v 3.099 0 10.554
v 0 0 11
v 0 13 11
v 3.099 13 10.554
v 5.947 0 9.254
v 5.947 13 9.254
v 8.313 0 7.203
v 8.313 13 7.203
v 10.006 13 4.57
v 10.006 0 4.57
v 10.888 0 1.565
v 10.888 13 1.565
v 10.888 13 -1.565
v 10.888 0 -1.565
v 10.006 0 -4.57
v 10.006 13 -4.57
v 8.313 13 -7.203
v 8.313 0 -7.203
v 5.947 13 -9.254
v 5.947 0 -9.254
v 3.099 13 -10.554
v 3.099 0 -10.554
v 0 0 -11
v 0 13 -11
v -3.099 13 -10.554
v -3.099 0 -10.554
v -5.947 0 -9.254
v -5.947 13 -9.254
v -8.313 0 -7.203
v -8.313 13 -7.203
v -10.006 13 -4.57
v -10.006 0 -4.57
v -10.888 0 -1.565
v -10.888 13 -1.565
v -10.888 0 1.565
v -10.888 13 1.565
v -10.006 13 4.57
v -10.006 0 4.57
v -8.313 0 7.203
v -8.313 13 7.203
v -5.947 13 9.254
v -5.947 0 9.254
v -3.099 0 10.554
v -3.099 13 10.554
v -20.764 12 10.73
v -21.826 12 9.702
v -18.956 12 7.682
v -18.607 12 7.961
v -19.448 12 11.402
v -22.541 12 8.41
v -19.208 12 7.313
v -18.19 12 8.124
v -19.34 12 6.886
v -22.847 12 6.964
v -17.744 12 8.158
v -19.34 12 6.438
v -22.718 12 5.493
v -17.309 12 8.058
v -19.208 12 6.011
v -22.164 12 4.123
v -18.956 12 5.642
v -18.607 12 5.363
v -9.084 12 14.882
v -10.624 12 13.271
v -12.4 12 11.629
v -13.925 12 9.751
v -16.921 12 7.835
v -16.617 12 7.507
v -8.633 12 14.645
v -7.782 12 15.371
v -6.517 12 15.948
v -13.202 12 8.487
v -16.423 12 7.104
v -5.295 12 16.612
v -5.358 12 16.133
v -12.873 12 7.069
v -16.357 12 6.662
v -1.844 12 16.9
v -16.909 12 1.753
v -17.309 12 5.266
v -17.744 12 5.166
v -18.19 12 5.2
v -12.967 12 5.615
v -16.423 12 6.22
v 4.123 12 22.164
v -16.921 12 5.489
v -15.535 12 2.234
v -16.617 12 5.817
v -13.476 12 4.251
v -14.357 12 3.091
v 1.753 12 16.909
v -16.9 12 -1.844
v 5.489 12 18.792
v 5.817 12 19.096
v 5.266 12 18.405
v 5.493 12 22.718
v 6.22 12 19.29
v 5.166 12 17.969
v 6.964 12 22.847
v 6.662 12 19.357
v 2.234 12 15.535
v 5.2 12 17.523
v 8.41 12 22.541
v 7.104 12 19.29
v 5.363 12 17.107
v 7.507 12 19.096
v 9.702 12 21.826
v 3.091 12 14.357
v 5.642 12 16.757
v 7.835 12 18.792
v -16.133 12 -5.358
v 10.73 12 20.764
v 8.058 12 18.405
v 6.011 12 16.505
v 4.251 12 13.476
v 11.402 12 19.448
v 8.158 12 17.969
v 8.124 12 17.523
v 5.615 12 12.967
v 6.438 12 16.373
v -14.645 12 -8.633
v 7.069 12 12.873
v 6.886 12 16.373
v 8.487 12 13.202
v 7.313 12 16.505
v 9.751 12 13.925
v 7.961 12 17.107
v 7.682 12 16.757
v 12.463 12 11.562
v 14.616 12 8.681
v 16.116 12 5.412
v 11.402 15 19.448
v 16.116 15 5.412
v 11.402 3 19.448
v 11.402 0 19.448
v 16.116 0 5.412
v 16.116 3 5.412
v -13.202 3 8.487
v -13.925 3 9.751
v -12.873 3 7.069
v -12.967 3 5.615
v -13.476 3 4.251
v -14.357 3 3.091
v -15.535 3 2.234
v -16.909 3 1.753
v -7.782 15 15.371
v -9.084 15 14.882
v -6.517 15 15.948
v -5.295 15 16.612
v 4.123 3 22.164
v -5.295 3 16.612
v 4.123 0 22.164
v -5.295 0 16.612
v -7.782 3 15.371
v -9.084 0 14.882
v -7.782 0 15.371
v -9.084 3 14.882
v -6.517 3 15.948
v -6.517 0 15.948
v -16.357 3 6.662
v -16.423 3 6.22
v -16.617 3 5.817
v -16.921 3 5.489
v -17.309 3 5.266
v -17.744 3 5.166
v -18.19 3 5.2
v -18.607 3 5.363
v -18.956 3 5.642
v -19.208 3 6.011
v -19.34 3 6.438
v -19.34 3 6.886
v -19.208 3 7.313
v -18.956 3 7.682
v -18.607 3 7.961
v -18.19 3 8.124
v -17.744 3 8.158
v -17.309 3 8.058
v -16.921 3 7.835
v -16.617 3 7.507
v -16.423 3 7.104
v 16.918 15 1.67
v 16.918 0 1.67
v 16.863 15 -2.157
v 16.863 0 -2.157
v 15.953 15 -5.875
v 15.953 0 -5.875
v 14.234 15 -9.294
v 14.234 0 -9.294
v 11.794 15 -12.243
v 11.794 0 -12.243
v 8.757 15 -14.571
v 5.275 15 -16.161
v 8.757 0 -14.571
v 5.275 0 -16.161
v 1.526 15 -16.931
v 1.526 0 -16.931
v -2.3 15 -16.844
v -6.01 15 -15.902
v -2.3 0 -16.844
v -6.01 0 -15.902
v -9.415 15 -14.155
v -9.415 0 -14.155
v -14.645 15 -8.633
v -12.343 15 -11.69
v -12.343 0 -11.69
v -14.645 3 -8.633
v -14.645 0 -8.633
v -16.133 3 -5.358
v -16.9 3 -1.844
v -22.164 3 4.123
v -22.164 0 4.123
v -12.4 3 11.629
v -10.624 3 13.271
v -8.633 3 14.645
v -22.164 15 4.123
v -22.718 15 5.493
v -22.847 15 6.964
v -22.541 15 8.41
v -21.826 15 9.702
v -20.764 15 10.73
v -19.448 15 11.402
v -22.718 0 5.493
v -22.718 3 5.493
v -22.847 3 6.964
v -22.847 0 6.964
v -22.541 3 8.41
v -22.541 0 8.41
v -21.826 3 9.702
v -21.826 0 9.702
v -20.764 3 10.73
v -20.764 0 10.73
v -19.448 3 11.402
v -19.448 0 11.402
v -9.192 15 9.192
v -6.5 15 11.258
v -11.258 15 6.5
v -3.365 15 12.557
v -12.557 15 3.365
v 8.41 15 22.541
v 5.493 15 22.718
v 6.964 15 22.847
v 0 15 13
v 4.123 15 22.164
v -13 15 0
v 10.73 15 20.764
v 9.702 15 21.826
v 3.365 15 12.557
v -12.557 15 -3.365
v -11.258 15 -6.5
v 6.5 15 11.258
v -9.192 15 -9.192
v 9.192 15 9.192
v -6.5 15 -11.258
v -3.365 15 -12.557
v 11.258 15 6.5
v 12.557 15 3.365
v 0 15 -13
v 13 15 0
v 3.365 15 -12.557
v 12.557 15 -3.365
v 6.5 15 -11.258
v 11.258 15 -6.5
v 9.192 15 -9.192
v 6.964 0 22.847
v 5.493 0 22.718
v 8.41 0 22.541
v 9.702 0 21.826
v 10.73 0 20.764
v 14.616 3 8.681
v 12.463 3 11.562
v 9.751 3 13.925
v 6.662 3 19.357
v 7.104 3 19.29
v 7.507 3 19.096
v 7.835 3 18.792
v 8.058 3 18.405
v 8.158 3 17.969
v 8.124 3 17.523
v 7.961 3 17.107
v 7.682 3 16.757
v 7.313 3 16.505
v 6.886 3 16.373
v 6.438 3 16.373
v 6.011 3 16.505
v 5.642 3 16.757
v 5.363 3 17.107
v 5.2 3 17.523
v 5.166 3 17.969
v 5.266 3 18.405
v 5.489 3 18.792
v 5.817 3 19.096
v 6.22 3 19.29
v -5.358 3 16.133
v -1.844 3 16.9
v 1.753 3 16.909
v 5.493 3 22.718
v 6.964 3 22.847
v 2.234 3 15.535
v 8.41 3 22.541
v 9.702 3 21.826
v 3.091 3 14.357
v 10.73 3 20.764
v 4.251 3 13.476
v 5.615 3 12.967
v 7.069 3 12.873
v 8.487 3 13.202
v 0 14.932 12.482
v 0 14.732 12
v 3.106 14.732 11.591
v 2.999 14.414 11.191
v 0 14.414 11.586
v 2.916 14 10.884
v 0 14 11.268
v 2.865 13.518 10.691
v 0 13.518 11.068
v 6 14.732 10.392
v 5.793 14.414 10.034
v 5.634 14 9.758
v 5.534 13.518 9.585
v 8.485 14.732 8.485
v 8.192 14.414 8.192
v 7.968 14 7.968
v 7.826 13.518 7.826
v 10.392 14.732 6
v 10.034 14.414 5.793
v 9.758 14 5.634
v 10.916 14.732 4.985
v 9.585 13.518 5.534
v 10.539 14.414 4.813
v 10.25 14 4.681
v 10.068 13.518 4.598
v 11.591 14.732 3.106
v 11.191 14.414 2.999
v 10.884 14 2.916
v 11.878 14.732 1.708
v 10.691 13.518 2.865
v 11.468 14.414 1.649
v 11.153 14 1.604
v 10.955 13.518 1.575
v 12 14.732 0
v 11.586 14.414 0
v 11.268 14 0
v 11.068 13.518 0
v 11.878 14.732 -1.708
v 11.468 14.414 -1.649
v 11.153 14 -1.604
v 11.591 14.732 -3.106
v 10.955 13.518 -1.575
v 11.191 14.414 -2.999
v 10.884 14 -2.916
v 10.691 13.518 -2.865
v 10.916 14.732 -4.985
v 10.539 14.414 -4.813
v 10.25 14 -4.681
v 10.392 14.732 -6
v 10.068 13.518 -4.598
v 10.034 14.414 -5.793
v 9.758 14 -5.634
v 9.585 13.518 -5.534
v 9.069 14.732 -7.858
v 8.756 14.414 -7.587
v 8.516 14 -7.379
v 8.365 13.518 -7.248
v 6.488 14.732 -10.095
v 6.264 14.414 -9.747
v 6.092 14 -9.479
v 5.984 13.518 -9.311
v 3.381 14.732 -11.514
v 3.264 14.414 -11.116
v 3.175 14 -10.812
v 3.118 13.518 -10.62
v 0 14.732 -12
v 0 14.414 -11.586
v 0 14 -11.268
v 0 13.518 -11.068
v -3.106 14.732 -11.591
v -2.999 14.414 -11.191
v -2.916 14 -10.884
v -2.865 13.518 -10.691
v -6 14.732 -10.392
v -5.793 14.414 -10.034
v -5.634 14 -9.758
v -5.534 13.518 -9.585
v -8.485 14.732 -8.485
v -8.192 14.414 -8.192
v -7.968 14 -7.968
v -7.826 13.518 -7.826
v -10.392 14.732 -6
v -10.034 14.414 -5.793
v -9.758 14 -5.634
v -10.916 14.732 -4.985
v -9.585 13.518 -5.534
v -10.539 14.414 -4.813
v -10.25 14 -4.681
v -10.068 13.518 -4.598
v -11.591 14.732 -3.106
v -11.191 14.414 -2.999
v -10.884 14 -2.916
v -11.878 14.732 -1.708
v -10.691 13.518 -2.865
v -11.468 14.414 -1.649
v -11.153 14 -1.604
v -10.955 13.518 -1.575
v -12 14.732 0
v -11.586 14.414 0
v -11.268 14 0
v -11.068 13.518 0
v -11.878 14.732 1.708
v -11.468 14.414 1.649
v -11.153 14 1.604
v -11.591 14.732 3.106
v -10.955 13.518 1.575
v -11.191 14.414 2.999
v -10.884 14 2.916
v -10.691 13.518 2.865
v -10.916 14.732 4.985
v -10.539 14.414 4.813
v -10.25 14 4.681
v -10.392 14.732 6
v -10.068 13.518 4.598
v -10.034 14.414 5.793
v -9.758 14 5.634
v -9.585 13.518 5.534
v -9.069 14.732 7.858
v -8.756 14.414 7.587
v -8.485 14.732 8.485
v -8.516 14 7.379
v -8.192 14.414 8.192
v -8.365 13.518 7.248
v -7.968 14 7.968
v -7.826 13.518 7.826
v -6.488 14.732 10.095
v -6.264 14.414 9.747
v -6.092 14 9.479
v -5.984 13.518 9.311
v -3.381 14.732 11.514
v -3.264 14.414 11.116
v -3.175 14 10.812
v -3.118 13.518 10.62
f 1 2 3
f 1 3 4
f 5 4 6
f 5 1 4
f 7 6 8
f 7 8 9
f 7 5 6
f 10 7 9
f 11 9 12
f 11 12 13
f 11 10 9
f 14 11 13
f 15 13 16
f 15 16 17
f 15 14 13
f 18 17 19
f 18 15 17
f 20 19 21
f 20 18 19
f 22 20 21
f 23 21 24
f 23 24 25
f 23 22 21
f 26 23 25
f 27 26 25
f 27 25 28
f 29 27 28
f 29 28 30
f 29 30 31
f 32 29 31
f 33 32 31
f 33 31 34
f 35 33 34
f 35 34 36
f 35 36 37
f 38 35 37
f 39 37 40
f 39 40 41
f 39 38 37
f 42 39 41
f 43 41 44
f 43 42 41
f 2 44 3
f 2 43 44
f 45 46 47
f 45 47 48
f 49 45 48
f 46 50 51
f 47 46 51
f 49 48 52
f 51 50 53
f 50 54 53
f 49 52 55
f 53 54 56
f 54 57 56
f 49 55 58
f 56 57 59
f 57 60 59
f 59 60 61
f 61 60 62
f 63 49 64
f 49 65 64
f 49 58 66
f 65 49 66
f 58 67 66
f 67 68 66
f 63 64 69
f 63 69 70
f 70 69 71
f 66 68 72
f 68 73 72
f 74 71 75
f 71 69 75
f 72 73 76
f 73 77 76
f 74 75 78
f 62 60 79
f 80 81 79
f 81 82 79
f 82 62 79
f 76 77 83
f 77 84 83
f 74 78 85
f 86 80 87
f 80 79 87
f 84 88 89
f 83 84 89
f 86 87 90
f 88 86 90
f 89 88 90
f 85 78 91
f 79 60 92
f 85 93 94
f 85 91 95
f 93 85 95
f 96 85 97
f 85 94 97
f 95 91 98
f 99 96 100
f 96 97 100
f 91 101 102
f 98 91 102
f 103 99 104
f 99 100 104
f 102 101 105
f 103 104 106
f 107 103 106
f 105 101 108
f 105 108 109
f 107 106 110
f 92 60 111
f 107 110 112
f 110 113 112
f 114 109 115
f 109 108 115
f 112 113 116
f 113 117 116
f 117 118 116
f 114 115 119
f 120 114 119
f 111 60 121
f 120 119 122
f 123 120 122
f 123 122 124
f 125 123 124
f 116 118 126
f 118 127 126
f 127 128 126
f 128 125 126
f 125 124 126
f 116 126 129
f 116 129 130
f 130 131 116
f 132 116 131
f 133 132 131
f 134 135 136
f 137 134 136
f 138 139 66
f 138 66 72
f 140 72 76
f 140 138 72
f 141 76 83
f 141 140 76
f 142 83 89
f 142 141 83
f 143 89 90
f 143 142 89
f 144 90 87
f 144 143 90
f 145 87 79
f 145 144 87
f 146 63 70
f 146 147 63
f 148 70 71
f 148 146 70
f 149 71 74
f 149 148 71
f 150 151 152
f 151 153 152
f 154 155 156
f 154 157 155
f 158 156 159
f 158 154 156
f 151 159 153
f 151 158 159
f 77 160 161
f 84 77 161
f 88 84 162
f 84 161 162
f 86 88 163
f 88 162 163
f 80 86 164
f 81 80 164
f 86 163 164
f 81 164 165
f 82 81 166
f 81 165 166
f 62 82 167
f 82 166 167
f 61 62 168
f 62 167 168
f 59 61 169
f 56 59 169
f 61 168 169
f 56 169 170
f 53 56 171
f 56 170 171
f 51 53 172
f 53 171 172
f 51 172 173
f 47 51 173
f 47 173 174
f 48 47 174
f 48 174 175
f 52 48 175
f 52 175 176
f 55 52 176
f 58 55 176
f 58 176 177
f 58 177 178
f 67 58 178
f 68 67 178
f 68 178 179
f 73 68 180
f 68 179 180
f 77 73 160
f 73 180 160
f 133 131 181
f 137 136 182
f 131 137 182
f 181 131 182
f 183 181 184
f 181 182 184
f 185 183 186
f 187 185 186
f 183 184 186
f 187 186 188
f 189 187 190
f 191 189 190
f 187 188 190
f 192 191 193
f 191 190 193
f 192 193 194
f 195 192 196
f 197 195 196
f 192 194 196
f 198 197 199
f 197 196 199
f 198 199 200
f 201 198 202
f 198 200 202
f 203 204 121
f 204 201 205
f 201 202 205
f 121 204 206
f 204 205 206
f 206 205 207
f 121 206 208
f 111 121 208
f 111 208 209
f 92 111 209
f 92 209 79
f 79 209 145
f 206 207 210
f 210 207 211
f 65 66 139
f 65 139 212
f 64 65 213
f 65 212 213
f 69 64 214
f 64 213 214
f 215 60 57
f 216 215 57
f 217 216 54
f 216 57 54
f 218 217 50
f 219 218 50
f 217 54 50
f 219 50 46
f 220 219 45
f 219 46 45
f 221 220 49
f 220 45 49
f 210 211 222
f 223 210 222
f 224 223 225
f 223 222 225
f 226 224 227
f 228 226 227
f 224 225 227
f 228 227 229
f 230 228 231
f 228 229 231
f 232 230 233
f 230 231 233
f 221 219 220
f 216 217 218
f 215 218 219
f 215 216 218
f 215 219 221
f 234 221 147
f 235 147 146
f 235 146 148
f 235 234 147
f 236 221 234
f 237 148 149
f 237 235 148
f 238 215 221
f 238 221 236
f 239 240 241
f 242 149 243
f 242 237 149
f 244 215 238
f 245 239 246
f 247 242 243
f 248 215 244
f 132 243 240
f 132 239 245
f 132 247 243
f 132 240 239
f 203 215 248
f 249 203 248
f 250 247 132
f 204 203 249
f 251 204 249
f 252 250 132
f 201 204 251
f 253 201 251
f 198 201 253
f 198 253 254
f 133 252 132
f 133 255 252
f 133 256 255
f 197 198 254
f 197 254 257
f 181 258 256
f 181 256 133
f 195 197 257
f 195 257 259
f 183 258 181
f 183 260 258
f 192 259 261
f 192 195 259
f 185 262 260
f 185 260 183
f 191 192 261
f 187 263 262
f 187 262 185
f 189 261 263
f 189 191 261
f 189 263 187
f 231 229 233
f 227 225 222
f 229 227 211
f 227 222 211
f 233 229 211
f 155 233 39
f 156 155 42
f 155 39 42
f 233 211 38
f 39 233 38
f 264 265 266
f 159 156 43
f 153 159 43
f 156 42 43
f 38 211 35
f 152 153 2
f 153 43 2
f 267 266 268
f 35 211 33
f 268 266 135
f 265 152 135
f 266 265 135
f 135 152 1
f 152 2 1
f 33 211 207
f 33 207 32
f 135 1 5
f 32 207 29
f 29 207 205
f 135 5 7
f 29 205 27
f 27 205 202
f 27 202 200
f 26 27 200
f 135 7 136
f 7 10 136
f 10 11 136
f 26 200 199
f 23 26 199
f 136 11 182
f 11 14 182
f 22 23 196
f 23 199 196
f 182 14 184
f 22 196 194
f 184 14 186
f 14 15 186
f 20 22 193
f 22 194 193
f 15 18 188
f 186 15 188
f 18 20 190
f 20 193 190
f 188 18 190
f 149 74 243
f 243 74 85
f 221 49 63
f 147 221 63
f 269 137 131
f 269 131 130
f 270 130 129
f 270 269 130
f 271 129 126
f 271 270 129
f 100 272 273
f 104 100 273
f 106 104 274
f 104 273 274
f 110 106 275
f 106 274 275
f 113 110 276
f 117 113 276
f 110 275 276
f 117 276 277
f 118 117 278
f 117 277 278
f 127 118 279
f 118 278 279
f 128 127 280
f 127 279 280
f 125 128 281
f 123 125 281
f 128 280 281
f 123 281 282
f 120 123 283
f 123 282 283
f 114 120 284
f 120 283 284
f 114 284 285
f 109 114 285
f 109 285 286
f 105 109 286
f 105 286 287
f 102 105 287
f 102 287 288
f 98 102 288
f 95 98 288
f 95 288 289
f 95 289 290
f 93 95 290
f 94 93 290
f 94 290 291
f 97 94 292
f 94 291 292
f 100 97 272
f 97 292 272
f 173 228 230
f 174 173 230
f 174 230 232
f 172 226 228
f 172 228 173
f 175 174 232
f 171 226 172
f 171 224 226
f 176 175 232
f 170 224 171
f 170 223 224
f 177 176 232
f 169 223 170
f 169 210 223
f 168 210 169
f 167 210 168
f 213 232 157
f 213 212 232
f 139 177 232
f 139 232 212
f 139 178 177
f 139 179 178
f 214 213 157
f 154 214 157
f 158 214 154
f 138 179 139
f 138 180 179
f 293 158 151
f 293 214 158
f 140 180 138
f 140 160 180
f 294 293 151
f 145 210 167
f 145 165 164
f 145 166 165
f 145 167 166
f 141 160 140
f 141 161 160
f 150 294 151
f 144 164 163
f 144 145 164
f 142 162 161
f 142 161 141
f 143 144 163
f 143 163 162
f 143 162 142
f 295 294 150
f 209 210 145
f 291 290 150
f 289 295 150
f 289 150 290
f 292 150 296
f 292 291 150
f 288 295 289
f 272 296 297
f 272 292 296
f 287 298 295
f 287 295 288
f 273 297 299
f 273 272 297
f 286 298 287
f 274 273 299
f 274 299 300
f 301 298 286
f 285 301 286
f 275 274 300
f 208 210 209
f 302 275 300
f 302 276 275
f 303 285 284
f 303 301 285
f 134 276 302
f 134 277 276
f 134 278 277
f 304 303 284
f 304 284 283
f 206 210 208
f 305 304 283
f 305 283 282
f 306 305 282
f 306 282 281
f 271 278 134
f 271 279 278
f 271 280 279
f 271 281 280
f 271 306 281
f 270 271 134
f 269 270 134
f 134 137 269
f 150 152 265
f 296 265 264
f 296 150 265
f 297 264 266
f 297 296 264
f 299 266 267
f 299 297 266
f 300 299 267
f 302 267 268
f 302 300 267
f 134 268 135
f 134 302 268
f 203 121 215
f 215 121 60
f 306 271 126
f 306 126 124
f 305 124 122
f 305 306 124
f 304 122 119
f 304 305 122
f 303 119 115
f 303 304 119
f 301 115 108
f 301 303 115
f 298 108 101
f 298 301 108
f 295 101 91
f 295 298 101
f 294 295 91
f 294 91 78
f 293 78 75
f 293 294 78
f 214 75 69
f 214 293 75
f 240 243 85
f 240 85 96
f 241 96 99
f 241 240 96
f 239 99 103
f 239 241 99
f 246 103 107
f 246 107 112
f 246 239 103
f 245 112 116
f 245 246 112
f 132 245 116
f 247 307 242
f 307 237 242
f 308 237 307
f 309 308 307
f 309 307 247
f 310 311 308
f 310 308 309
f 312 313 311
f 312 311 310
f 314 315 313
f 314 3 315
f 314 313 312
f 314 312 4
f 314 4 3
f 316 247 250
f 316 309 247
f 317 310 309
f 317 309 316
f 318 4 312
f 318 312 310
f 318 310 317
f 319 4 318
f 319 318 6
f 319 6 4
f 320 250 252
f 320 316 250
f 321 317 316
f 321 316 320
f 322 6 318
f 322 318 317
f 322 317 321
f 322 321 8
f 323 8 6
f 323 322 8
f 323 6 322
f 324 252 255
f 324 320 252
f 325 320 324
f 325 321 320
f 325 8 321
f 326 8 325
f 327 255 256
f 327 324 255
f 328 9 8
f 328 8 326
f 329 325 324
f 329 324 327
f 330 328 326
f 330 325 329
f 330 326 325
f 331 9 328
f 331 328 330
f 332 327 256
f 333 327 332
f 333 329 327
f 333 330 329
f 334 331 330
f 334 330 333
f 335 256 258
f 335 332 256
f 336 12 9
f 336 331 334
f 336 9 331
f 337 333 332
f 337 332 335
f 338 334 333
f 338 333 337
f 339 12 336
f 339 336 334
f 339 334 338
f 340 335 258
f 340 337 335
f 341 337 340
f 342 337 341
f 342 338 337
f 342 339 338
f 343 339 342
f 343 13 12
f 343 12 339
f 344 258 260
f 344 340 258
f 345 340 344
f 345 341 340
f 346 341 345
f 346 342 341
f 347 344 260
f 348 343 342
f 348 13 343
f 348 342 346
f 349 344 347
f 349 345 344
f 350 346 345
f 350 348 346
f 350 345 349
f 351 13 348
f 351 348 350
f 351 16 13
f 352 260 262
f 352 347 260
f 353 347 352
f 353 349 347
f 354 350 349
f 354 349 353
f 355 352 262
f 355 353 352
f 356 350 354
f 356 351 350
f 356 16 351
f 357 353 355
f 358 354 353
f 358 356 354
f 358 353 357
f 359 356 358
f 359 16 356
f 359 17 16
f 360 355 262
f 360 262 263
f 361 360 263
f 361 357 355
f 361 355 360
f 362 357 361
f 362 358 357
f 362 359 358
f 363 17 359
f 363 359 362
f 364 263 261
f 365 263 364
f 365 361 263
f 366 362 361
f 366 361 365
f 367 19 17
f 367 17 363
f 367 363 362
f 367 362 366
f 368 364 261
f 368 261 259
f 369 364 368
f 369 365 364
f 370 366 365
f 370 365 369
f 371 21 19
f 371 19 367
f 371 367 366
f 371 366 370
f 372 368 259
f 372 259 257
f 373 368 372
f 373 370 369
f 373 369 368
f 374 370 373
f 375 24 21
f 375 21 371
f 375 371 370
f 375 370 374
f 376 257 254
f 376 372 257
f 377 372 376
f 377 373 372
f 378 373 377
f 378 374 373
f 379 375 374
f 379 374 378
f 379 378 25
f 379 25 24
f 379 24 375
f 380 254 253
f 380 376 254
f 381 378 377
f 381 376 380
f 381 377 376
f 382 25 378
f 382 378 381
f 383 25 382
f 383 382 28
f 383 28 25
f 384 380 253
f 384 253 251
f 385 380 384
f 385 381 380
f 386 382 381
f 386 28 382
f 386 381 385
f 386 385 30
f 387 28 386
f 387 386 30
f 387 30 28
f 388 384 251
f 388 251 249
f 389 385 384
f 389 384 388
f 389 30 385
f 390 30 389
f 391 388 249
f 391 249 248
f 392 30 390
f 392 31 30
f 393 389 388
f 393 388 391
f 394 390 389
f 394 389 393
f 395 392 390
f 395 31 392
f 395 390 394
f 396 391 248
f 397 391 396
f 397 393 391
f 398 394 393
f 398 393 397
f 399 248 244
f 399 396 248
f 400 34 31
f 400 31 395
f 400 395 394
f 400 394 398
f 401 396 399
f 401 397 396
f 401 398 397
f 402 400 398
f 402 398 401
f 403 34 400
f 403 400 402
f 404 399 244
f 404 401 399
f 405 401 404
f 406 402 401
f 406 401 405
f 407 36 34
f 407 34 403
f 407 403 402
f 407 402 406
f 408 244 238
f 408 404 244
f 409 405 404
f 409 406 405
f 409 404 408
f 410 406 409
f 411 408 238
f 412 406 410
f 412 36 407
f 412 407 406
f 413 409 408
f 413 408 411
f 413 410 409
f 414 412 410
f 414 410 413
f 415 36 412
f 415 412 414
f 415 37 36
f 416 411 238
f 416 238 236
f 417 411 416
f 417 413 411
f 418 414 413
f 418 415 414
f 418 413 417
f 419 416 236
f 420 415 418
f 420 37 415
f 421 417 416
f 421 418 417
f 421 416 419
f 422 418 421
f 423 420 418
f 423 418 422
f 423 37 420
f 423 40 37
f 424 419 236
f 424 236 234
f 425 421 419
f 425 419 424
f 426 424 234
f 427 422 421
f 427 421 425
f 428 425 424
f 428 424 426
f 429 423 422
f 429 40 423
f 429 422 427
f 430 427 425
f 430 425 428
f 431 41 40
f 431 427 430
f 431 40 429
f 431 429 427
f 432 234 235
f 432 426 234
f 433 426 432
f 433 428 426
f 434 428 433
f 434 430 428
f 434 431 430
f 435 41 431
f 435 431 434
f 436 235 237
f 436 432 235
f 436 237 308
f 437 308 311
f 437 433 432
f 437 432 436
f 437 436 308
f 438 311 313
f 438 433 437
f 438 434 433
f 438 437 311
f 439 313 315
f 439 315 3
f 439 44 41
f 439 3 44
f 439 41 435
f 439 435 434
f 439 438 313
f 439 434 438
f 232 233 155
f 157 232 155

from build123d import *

# Parameters (mm, degrees)
SKETCH1_R               = 17
SKETCH1_R_2             = 11
BOSS_EXTRUDE1_DEPTH     = 15
BOSS_EXTRUDE2_START     = -15
BOSS_EXTRUDE2_DEPTH     = 15
FILLET1_R               = 5
CUT_EXTRUDE1_START      = -12
SKETCH3_R               = 1.5
CUT_EXTRUDE1_DEPTH      = 9
CIRPATTERN1_START       = 3
CIRPATTERN1_DEPTH       = 9
CIRPATTERN1_2_DEPTH     = 3
CIRPATTERN1_START_2     = 12
CIRPATTERN1_3_DEPTH     = 3
CIRPATTERN1_4_OUTLINE_R = 1.5
CIRPATTERN1_4_DEPTH     = 9
FILLET2_R               = 20
FILLET3_R               = 2


# Read off the part's stored shape, not the designer's step: CirPattern1
with BuildPart() as part:
    # Sketch1 → Boss-Extrude1 (new body)
    with BuildSketch(Plane(origin=(0, 0, 0), x_dir=(1, 0, 0), z_dir=(0, 1, 0))):
        with Locations(Location((0, 0, 0), (0, 0, 270))):
            Circle(SKETCH1_R)
        with Locations(Location((0, 0, 0), (0, 0, 270))):
            Circle(SKETCH1_R_2, mode=Mode.SUBTRACT)
    extrude(amount=BOSS_EXTRUDE1_DEPTH)

    # Sketch2 → Boss-Extrude2 (add)
    with BuildSketch(Plane(origin=(0, 15, 0), x_dir=(1, 0, 0), z_dir=(0, 1, 0)).offset(BOSS_EXTRUDE2_START)):
        with BuildLine():
            Line((-8.632611981, -14.645067784), (9.437831165, -25.296785229))
            Line((9.437831165, -25.296785229), (16.115556306, -5.411916938))
            ThreePointArc((16.115556306, -5.411916938), (5.942338141, -15.927605514), (-8.632611981, -14.645067784))
        make_face()
    extrude(amount=BOSS_EXTRUDE2_DEPTH)

    # Fillet1
    fillet1_edges = [part.edges().sort_by_distance(p)[0] for p in [
        (9.437831165, 7.5, 25.296785229),
    ]]
    fillet(fillet1_edges, radius=FILLET1_R)

    # Sketch3 → Cut-Extrude1 (cut)
    with BuildSketch(Plane(origin=(0, 15, 0), x_dir=(1, 0, 0), z_dir=(0, 1, 0)).offset(CUT_EXTRUDE1_START)):
        with BuildLine():
            ThreePointArc((1.752523284, -16.909425246), (-3.621565103, -16.609764183), (-8.632611981, -14.645067784))
            Line((-8.632611981, -14.645067784), (4.122994946, -22.163927157))
            ThreePointArc((4.122994946, -22.163927157), (8.409744981, -22.541144136), (11.401867971, -19.448294555))
            Line((11.401867971, -19.448294555), (16.115556306, -5.411916938))
            ThreePointArc((16.115556306, -5.411916938), (13.615928399, -10.178727515), (9.751380337, -13.925177971))
            ThreePointArc((9.751380337, -13.925177971), (4.914251957, -13.171964422), (1.752523284, -16.909425246))
        make_face()
        with Locations(Location((6.661998469, -17.856554279, 0), (0, 0, 270))):
            Circle(SKETCH3_R, mode=Mode.SUBTRACT)
    extrude(amount=CUT_EXTRUDE1_DEPTH, mode=Mode.SUBTRACT)

    # CirPattern1 outline → CirPattern1 (cut)
    with BuildSketch(Plane(origin=(0, 0, 0), x_dir=(1, 0, 0), z_dir=(0, 1, 0)).offset(CIRPATTERN1_START)):
        with BuildLine():
            ThreePointArc((-13.925177971, -9.751380337), (-13.171964422, -4.914251957), (-16.909425246, -1.752523284))
            ThreePointArc((-16.909425246, -1.752523284), (-15.927605515, -5.942338141), (-13.925177971, -9.751380337))
        make_face()
    extrude(amount=CIRPATTERN1_DEPTH, mode=Mode.SUBTRACT)

    # CirPattern1 2 outline → CirPattern1 2 (add)
    with BuildSketch(Plane(origin=(0, 0, 0), x_dir=(1, 0, 0), z_dir=(0, 1, 0))):
        with BuildLine():
            Line((-14.645067784, 8.632611981), (-22.163927157, -4.122994946))
            ThreePointArc((-22.163927157, -4.122994946), (-22.541144136, -8.409744981), (-19.448294555, -11.401867971))
            Line((-19.448294555, -11.401867971), (-7.099245913, -15.548918451))
            Line((-7.099245913, -15.548918451), (-8.632611981, -14.645067784))
            ThreePointArc((-8.632611981, -14.645067784), (-16.459805212, -4.25144827), (-14.645067784, 8.632611981))
        make_face()
    extrude(amount=CIRPATTERN1_2_DEPTH)

    # CirPattern1 3 outline → CirPattern1 3 (add)
    with BuildSketch(Plane(origin=(0, 0, 0), x_dir=(1, 0, 0), z_dir=(0, 1, 0)).offset(CIRPATTERN1_START_2)):
        with BuildLine():
            Line((-14.645067784, 8.632611981), (-22.163927157, -4.122994946))
            ThreePointArc((-22.163927157, -4.122994946), (-22.541144136, -8.409744981), (-19.448294555, -11.401867971))
            Line((-19.448294555, -11.401867971), (-7.099245913, -15.548918451))
            Line((-7.099245913, -15.548918451), (-8.632611981, -14.645067784))
            ThreePointArc((-8.632611981, -14.645067784), (-16.459805212, -4.25144827), (-14.645067784, 8.632611981))
        make_face()
    extrude(amount=CIRPATTERN1_3_DEPTH)

    # CirPattern1 4 outline → CirPattern1 4 (add)
    with BuildSketch(Plane(origin=(0, 0, 0), x_dir=(1, 0, 0), z_dir=(0, 1, 0)).offset(CIRPATTERN1_START)):
        with Locations((-17.856554279, -6.661998469)):
            Circle(CIRPATTERN1_4_OUTLINE_R)
    extrude(amount=CIRPATTERN1_4_DEPTH)

    # Fillet2
    fillet2_edges = [part.edges().sort_by_distance(p)[0] for p in [
        (-7.099245913, 13.5, 15.548918451),
        (-7.099245913, 1.5, 15.548918451),
    ]]
    fillet(fillet2_edges, radius=FILLET2_R)

    # Fillet3
    fillet3_edges = [part.edges().sort_by_distance(p)[0] for p in [
        (0, 15, -11),
    ]]
    fillet(fillet3_edges, radius=FILLET3_R)


solid = part.part
